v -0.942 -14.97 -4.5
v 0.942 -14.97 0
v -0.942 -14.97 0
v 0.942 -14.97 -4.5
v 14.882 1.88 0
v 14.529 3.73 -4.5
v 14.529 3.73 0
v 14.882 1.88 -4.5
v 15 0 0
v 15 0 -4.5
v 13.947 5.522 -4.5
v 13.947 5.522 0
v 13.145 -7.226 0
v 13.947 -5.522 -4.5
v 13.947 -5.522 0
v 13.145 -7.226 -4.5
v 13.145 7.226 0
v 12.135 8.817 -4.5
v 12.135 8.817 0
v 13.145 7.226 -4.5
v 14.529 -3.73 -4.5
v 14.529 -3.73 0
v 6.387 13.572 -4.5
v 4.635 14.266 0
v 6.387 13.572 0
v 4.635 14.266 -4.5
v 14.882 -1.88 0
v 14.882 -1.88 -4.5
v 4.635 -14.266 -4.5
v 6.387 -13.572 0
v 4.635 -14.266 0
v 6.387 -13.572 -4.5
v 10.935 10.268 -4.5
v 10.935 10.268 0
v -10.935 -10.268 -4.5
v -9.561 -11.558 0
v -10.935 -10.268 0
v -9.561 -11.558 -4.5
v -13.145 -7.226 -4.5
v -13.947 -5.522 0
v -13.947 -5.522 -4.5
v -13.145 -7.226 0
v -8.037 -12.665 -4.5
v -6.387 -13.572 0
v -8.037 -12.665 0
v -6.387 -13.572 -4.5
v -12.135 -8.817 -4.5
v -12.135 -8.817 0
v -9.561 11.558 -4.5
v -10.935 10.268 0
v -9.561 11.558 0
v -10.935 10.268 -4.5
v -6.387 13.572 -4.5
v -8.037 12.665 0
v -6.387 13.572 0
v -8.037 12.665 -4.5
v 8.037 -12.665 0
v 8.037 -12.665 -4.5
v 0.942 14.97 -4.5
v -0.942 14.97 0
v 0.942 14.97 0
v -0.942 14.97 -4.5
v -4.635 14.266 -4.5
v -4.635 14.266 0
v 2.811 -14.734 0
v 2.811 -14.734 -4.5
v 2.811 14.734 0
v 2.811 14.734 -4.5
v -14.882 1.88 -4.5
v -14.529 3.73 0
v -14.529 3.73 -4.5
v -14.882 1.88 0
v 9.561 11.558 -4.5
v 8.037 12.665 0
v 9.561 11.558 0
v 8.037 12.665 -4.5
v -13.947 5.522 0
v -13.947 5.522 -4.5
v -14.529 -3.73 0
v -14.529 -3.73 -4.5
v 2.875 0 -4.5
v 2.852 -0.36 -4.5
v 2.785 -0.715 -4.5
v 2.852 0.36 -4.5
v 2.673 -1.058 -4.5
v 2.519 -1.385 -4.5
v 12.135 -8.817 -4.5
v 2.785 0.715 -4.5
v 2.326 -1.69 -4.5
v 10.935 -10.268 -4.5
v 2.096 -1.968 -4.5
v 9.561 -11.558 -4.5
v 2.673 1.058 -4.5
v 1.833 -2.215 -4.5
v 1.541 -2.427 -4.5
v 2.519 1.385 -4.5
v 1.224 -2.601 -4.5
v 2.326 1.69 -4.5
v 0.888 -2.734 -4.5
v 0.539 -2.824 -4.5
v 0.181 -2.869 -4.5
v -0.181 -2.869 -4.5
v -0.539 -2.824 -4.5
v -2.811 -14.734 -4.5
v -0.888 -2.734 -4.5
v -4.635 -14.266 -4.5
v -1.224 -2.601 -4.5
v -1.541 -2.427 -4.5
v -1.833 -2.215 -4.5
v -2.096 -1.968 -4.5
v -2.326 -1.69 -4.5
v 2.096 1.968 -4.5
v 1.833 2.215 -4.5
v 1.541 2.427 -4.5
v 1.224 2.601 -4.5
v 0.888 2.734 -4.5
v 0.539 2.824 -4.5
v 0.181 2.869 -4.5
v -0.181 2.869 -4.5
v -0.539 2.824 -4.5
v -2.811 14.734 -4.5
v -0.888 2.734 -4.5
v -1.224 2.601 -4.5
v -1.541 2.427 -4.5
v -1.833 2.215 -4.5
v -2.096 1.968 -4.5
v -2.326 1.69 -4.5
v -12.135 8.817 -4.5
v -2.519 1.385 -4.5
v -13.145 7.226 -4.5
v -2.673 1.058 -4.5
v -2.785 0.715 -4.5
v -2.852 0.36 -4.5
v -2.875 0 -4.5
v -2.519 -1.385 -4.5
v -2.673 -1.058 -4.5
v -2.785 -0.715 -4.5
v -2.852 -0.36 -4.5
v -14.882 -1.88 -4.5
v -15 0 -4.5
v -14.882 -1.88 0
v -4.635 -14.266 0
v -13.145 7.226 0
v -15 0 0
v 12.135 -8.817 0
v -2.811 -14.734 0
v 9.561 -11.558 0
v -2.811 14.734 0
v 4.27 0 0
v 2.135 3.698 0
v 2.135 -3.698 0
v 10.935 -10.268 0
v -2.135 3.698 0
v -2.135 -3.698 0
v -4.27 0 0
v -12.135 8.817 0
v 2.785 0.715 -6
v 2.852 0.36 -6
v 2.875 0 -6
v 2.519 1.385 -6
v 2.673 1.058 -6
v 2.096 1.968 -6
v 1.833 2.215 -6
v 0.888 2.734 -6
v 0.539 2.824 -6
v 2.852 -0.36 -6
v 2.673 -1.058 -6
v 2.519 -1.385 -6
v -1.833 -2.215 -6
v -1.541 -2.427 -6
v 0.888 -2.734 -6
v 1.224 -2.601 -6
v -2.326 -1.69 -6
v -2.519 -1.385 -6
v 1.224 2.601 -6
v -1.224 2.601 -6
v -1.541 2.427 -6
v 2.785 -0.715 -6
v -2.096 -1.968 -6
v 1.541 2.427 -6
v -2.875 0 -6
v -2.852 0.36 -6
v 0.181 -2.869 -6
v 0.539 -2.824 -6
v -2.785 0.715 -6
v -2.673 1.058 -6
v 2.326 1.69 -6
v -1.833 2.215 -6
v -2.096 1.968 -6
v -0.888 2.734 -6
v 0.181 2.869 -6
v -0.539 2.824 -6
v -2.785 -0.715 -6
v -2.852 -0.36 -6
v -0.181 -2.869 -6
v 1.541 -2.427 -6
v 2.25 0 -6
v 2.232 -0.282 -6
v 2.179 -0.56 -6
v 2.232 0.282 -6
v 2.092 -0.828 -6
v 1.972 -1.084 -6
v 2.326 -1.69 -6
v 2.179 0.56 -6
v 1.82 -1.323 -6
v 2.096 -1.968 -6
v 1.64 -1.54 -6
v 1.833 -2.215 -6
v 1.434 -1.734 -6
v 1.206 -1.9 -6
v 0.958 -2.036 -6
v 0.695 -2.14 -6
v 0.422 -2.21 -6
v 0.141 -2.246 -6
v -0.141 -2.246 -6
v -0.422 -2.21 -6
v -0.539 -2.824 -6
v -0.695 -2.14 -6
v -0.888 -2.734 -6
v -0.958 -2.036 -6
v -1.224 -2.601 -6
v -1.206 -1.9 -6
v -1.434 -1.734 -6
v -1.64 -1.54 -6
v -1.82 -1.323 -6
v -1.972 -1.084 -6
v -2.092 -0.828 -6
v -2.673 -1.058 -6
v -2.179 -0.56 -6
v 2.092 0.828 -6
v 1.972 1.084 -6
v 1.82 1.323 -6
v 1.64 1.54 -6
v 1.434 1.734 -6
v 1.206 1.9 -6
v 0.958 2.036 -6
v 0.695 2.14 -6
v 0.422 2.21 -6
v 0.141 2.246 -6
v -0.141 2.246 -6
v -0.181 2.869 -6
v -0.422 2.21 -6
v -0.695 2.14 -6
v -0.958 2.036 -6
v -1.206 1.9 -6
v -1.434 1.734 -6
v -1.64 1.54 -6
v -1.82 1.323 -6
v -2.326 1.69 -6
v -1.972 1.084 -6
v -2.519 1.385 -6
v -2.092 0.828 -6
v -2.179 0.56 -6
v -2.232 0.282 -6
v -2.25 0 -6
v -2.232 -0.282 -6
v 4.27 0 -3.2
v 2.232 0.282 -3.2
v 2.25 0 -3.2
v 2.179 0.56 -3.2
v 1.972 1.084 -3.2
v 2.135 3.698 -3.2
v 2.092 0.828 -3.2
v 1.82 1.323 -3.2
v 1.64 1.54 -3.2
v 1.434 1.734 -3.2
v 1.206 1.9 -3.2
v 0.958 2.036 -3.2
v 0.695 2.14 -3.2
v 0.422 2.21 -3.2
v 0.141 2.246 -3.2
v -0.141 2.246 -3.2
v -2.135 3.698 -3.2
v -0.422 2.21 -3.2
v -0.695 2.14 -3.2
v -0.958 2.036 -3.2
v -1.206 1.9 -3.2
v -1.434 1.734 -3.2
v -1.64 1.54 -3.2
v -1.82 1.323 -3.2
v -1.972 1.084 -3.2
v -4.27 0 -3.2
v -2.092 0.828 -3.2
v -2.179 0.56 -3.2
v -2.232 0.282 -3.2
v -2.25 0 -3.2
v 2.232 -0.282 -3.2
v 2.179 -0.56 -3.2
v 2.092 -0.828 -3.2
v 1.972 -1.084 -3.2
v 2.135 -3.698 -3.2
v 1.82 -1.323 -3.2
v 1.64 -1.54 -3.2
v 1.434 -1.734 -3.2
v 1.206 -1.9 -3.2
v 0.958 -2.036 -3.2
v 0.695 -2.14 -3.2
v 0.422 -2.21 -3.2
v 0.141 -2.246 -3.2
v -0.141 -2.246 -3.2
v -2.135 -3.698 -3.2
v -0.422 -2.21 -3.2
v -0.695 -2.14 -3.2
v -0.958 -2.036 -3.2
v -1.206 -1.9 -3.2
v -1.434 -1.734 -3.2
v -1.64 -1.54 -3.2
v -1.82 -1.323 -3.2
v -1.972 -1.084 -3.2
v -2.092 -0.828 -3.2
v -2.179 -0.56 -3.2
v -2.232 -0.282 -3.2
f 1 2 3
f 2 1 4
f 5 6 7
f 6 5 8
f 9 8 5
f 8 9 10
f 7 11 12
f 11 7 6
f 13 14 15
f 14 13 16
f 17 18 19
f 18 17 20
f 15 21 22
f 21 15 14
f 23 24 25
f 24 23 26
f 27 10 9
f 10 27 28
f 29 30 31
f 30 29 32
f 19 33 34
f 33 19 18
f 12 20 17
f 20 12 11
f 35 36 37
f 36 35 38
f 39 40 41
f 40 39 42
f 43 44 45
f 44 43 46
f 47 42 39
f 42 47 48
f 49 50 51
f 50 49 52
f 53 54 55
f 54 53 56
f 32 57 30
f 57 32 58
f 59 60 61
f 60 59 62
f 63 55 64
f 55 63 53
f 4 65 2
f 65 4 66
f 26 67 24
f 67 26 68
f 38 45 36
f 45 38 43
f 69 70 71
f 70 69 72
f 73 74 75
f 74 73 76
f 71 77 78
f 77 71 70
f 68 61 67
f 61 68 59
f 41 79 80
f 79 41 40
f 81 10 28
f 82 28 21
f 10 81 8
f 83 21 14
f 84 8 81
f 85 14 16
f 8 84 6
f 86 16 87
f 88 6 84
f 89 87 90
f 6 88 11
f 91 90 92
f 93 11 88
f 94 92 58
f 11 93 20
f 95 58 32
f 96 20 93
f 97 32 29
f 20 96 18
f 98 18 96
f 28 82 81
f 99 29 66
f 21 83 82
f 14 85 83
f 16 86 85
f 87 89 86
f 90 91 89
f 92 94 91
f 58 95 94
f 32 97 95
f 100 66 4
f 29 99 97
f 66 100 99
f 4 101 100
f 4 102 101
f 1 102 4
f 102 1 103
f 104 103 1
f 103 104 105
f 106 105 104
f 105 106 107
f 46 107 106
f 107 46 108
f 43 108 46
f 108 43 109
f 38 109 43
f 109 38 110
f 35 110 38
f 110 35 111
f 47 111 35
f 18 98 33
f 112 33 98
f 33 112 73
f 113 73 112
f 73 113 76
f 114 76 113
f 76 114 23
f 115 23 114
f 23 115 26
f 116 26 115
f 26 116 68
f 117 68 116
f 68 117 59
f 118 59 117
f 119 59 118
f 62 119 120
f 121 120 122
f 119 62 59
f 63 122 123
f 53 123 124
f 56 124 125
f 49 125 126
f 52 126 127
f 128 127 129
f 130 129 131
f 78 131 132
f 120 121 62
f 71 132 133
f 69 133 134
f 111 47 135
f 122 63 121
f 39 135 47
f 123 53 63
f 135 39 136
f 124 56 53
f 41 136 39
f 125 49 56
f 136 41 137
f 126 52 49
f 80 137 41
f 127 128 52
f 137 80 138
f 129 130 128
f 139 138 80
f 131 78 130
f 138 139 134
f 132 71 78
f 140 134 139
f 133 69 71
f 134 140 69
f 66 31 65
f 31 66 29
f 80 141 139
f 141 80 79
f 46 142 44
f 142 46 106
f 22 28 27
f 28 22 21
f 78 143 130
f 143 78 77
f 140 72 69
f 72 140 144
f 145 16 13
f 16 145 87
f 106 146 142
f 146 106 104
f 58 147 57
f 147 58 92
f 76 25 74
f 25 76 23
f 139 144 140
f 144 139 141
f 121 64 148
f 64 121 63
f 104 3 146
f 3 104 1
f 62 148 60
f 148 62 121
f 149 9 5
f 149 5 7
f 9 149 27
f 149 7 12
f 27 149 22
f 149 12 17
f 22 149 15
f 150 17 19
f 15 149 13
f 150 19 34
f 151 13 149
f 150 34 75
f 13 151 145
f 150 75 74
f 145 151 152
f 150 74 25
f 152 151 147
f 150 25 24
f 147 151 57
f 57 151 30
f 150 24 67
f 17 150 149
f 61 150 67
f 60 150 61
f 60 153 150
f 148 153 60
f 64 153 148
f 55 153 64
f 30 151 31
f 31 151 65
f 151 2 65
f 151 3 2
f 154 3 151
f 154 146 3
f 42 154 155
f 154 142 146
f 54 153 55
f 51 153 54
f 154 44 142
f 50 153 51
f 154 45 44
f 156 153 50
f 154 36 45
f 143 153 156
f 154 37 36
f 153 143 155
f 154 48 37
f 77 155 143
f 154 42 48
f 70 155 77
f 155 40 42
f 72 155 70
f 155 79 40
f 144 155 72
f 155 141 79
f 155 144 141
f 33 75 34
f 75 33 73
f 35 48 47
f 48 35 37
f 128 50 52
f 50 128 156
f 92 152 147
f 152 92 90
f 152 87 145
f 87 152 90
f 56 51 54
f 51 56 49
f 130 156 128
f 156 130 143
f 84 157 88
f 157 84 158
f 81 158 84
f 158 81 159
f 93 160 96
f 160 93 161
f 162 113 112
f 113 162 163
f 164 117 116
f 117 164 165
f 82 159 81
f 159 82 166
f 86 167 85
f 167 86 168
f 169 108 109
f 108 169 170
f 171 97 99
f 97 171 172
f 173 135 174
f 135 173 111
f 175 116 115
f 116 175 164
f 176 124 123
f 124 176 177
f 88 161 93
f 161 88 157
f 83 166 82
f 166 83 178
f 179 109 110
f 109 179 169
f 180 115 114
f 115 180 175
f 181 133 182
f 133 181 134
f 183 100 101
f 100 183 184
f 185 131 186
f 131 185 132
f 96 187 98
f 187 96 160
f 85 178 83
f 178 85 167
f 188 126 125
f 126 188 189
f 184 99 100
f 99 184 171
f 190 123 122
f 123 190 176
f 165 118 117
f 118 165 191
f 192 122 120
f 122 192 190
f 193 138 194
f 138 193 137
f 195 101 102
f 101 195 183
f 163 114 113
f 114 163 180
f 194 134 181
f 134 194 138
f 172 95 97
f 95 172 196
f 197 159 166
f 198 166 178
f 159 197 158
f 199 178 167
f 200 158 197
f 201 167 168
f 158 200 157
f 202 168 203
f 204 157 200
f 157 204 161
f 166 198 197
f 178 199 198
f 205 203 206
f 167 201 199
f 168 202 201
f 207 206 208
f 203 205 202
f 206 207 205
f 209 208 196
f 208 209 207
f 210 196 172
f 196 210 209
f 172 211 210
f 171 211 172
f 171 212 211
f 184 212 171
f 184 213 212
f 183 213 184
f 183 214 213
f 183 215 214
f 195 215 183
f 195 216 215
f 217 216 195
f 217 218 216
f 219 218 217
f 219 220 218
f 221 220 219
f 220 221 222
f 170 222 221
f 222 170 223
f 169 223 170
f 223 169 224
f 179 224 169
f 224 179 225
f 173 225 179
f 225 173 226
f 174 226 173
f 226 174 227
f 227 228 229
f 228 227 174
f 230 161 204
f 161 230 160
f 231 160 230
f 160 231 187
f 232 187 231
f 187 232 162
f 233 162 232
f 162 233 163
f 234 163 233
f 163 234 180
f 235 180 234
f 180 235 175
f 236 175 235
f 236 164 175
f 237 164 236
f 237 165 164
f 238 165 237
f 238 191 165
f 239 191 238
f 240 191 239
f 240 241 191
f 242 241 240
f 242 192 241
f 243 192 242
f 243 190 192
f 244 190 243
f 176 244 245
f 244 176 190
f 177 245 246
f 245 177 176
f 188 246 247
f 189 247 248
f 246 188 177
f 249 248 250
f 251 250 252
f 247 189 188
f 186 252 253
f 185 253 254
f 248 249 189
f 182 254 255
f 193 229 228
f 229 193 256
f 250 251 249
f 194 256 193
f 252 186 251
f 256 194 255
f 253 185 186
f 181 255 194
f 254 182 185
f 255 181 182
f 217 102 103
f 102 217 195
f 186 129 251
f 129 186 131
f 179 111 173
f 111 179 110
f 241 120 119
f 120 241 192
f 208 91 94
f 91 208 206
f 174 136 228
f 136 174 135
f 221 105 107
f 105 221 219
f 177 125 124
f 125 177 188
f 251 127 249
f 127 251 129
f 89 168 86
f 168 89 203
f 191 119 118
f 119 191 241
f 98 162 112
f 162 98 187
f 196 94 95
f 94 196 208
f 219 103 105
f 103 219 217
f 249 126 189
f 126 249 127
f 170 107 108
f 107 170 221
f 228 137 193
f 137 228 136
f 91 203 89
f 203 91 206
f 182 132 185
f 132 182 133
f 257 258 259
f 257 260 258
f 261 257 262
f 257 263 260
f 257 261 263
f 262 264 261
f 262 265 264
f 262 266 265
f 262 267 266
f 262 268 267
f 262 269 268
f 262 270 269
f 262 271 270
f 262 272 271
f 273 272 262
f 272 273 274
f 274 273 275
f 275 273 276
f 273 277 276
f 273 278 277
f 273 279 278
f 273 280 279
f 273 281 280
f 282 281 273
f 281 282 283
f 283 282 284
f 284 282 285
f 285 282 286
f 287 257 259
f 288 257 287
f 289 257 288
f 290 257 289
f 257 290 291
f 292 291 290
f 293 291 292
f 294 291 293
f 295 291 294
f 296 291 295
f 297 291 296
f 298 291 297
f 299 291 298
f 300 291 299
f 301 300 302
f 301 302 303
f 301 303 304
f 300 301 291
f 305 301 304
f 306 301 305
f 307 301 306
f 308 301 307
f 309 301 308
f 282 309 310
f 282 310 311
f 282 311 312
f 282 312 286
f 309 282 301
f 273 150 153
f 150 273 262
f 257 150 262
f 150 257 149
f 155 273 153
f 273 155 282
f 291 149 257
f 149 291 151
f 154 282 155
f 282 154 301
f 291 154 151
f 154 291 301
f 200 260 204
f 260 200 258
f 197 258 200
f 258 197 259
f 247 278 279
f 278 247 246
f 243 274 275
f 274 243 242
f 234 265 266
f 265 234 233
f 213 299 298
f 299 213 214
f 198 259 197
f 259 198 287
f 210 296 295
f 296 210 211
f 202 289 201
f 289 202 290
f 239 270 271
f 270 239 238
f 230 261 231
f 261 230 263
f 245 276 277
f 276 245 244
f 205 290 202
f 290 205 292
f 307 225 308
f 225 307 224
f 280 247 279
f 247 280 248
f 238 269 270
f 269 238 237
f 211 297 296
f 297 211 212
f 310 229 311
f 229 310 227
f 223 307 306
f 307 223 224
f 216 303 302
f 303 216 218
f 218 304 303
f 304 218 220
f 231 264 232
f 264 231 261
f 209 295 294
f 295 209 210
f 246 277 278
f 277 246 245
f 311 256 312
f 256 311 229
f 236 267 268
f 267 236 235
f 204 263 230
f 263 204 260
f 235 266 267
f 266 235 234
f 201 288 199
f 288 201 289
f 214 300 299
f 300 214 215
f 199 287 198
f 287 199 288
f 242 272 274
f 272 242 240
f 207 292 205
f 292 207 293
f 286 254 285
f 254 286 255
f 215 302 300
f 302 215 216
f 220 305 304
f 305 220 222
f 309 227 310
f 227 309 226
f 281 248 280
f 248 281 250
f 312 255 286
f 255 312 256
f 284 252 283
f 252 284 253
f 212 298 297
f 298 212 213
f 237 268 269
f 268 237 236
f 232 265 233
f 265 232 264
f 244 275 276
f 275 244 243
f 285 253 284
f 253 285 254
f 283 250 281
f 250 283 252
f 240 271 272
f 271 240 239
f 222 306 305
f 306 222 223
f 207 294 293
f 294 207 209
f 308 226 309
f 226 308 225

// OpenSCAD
$fn = 50;

difference() {
	union() {
		translate(v = [0, 0, -4.5]) {
			cylinder(h = 4.5, r = 15.0);
		}
		#translate(v = [0, 0, -6.0]) {
			cylinder(h = 6, r = 2.875);
		}
	}
	union() {
		translate(v = [0, 0, 0]) {
			rotate(a = [0, 0, 0]) {
				difference() {
					union() {
						translate(v = [0, 0, -3.2]) {
							linear_extrude(height = 3.2) {
								polygon(points = [[4.2698, 0.0], [2.1349000000000005, 3.697755269078796], [-2.134899999999999, 3.6977552690787965], [-4.2698, 5.228996902999369e-16], [-2.134900000000002, -3.6977552690787956], [2.1348999999999974, -3.697755269078798]]);
							}
						}
					}
					union();
				}
			}
		}
		#translate(v = [0, 0, -100.0]) {
			cylinder(h = 200, r = 2.25);
		}
	}
}
